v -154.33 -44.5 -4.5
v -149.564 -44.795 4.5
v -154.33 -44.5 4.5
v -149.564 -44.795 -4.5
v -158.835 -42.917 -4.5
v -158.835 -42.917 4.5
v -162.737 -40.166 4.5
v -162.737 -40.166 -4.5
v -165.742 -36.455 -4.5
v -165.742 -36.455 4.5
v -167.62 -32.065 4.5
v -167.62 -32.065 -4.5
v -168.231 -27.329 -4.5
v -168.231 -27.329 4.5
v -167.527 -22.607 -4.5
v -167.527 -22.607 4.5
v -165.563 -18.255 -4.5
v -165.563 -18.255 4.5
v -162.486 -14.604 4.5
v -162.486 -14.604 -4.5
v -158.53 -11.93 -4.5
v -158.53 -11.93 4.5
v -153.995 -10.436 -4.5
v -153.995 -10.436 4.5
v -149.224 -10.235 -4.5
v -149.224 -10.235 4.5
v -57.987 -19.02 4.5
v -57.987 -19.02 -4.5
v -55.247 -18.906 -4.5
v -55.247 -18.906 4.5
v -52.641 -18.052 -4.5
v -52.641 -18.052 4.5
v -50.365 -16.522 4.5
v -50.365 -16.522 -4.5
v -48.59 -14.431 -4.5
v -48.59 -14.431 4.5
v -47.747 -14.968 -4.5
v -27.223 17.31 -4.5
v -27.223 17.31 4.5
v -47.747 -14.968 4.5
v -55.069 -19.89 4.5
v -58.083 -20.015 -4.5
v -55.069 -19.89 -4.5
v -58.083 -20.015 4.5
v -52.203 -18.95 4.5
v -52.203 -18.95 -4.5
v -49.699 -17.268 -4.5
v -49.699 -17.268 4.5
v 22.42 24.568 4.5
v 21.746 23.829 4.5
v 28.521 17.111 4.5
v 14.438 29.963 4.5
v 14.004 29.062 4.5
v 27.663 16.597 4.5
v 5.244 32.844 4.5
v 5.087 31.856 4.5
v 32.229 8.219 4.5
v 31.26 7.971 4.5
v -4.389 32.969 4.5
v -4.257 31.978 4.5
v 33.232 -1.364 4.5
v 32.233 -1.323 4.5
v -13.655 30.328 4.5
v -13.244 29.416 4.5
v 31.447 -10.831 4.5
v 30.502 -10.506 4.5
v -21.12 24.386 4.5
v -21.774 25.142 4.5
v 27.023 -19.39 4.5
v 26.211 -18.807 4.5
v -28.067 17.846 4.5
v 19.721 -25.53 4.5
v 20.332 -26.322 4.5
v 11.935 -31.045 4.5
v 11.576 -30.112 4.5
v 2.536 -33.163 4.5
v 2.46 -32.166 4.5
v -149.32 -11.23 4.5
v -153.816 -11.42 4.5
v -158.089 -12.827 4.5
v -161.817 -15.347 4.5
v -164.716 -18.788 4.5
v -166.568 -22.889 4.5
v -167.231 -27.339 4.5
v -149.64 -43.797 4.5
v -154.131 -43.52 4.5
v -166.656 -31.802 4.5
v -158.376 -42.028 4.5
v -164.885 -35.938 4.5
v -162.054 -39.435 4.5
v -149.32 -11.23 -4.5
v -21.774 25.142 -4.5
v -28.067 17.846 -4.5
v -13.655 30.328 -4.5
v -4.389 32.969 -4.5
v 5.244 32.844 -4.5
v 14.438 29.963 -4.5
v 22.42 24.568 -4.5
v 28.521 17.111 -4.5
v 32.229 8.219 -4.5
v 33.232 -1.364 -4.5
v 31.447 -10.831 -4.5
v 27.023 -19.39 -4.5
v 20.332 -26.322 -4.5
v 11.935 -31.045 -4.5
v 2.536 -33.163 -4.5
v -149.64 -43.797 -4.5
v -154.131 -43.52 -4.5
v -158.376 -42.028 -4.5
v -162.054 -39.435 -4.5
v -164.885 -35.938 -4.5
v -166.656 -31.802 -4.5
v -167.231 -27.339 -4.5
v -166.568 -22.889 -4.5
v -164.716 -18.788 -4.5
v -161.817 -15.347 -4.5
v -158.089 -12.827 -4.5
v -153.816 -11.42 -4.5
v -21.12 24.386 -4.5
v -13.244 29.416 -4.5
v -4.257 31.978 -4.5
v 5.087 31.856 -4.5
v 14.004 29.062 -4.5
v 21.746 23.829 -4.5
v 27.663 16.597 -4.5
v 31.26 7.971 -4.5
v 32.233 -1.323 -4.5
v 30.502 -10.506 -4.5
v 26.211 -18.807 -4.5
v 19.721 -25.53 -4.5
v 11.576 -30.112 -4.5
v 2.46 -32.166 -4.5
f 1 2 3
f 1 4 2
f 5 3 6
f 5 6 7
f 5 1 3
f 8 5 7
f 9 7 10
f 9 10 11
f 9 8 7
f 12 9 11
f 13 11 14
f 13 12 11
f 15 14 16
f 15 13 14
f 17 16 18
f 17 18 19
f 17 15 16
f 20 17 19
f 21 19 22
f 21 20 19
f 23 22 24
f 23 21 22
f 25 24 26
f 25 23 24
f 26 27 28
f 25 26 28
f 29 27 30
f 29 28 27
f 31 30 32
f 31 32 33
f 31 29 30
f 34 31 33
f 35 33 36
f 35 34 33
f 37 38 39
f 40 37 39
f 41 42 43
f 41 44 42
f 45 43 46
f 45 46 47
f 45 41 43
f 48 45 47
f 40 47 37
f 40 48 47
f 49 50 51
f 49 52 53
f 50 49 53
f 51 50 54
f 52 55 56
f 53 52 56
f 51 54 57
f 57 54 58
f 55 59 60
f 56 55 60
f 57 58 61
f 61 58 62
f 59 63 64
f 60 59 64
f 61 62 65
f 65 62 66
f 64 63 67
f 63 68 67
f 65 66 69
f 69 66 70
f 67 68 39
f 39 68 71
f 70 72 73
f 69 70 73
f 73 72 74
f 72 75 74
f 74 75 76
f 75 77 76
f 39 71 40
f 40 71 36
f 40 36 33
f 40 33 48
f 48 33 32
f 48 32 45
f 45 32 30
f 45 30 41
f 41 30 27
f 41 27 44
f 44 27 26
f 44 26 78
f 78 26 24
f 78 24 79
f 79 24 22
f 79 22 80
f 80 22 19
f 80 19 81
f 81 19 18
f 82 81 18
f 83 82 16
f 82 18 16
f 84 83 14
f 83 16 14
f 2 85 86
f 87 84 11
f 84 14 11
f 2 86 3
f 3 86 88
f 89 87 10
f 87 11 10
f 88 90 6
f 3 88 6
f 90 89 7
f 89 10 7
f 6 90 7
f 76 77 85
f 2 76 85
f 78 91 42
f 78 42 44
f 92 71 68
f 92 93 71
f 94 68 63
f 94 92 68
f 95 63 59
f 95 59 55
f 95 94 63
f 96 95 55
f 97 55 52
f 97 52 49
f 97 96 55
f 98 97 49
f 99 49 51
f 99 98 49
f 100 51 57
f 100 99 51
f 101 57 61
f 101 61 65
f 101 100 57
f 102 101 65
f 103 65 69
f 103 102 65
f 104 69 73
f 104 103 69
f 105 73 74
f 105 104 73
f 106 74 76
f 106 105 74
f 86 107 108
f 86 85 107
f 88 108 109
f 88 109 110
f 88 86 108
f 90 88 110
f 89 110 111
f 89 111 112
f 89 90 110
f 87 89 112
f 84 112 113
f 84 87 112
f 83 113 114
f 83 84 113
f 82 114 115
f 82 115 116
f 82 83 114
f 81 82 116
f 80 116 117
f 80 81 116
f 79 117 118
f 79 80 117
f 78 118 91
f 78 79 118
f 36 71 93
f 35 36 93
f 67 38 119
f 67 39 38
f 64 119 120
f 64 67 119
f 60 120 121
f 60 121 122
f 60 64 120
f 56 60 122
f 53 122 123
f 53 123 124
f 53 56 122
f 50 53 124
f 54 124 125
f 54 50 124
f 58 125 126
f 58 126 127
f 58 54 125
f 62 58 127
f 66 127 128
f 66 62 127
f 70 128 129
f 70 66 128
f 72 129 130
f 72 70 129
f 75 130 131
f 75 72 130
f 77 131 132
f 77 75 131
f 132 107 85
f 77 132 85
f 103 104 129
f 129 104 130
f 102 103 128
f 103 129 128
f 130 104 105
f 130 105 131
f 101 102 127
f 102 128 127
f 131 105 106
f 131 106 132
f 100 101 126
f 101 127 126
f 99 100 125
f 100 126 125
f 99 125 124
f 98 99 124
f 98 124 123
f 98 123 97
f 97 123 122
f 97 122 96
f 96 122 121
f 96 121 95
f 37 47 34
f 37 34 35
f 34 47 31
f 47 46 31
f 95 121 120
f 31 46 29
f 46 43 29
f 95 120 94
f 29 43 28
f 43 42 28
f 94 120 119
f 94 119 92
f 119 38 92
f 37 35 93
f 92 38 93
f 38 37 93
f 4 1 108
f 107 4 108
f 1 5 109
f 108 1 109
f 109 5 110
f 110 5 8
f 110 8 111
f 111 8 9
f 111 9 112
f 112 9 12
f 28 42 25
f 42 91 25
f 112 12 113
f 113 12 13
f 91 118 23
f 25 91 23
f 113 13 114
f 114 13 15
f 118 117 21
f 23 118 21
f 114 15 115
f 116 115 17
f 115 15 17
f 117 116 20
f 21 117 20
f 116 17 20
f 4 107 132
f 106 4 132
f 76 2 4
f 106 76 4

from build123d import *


with BuildPart() as part:
    # Sweep1: sweep along a path in Sketch2
    with BuildLine(Plane.XY) as sweep1_path:
        Line((2.459788124, -32.166085282), (-149.640466326, -43.797416737))
        ThreePointArc((-149.640466326, -43.797416737), (-167.230963528, -27.339263039), (-149.320184824, -11.230246272))
        Line((-149.320184824, -11.230246272), (-58.083261257, -20.015194383))
        ThreePointArc((-58.083261257, -20.015194383), (-52.202583099, -18.950464372), (-47.746530099, -14.968050876))
        Line((-47.746530099, -14.968050876), (-27.222888137, 17.309591604))
        ThreePointArc((-27.222888137, 17.309591604), (27.663395153, 16.596510736), (2.459788124, -32.166085282))
    # Sketch3 → Sweep1 (sweep)
    with BuildSketch(Plane(origin=(0, 0, 0), x_dir=(1, 0, 0), z_dir=(0, 1, 0))):
        Polygon((32.26, 0), (32.26, -4.5), (33.26, -4.5), (33.26, 4.5), (32.26, 4.5), align=None)
    sweep(path=sweep1_path.line)


solid = part.part
